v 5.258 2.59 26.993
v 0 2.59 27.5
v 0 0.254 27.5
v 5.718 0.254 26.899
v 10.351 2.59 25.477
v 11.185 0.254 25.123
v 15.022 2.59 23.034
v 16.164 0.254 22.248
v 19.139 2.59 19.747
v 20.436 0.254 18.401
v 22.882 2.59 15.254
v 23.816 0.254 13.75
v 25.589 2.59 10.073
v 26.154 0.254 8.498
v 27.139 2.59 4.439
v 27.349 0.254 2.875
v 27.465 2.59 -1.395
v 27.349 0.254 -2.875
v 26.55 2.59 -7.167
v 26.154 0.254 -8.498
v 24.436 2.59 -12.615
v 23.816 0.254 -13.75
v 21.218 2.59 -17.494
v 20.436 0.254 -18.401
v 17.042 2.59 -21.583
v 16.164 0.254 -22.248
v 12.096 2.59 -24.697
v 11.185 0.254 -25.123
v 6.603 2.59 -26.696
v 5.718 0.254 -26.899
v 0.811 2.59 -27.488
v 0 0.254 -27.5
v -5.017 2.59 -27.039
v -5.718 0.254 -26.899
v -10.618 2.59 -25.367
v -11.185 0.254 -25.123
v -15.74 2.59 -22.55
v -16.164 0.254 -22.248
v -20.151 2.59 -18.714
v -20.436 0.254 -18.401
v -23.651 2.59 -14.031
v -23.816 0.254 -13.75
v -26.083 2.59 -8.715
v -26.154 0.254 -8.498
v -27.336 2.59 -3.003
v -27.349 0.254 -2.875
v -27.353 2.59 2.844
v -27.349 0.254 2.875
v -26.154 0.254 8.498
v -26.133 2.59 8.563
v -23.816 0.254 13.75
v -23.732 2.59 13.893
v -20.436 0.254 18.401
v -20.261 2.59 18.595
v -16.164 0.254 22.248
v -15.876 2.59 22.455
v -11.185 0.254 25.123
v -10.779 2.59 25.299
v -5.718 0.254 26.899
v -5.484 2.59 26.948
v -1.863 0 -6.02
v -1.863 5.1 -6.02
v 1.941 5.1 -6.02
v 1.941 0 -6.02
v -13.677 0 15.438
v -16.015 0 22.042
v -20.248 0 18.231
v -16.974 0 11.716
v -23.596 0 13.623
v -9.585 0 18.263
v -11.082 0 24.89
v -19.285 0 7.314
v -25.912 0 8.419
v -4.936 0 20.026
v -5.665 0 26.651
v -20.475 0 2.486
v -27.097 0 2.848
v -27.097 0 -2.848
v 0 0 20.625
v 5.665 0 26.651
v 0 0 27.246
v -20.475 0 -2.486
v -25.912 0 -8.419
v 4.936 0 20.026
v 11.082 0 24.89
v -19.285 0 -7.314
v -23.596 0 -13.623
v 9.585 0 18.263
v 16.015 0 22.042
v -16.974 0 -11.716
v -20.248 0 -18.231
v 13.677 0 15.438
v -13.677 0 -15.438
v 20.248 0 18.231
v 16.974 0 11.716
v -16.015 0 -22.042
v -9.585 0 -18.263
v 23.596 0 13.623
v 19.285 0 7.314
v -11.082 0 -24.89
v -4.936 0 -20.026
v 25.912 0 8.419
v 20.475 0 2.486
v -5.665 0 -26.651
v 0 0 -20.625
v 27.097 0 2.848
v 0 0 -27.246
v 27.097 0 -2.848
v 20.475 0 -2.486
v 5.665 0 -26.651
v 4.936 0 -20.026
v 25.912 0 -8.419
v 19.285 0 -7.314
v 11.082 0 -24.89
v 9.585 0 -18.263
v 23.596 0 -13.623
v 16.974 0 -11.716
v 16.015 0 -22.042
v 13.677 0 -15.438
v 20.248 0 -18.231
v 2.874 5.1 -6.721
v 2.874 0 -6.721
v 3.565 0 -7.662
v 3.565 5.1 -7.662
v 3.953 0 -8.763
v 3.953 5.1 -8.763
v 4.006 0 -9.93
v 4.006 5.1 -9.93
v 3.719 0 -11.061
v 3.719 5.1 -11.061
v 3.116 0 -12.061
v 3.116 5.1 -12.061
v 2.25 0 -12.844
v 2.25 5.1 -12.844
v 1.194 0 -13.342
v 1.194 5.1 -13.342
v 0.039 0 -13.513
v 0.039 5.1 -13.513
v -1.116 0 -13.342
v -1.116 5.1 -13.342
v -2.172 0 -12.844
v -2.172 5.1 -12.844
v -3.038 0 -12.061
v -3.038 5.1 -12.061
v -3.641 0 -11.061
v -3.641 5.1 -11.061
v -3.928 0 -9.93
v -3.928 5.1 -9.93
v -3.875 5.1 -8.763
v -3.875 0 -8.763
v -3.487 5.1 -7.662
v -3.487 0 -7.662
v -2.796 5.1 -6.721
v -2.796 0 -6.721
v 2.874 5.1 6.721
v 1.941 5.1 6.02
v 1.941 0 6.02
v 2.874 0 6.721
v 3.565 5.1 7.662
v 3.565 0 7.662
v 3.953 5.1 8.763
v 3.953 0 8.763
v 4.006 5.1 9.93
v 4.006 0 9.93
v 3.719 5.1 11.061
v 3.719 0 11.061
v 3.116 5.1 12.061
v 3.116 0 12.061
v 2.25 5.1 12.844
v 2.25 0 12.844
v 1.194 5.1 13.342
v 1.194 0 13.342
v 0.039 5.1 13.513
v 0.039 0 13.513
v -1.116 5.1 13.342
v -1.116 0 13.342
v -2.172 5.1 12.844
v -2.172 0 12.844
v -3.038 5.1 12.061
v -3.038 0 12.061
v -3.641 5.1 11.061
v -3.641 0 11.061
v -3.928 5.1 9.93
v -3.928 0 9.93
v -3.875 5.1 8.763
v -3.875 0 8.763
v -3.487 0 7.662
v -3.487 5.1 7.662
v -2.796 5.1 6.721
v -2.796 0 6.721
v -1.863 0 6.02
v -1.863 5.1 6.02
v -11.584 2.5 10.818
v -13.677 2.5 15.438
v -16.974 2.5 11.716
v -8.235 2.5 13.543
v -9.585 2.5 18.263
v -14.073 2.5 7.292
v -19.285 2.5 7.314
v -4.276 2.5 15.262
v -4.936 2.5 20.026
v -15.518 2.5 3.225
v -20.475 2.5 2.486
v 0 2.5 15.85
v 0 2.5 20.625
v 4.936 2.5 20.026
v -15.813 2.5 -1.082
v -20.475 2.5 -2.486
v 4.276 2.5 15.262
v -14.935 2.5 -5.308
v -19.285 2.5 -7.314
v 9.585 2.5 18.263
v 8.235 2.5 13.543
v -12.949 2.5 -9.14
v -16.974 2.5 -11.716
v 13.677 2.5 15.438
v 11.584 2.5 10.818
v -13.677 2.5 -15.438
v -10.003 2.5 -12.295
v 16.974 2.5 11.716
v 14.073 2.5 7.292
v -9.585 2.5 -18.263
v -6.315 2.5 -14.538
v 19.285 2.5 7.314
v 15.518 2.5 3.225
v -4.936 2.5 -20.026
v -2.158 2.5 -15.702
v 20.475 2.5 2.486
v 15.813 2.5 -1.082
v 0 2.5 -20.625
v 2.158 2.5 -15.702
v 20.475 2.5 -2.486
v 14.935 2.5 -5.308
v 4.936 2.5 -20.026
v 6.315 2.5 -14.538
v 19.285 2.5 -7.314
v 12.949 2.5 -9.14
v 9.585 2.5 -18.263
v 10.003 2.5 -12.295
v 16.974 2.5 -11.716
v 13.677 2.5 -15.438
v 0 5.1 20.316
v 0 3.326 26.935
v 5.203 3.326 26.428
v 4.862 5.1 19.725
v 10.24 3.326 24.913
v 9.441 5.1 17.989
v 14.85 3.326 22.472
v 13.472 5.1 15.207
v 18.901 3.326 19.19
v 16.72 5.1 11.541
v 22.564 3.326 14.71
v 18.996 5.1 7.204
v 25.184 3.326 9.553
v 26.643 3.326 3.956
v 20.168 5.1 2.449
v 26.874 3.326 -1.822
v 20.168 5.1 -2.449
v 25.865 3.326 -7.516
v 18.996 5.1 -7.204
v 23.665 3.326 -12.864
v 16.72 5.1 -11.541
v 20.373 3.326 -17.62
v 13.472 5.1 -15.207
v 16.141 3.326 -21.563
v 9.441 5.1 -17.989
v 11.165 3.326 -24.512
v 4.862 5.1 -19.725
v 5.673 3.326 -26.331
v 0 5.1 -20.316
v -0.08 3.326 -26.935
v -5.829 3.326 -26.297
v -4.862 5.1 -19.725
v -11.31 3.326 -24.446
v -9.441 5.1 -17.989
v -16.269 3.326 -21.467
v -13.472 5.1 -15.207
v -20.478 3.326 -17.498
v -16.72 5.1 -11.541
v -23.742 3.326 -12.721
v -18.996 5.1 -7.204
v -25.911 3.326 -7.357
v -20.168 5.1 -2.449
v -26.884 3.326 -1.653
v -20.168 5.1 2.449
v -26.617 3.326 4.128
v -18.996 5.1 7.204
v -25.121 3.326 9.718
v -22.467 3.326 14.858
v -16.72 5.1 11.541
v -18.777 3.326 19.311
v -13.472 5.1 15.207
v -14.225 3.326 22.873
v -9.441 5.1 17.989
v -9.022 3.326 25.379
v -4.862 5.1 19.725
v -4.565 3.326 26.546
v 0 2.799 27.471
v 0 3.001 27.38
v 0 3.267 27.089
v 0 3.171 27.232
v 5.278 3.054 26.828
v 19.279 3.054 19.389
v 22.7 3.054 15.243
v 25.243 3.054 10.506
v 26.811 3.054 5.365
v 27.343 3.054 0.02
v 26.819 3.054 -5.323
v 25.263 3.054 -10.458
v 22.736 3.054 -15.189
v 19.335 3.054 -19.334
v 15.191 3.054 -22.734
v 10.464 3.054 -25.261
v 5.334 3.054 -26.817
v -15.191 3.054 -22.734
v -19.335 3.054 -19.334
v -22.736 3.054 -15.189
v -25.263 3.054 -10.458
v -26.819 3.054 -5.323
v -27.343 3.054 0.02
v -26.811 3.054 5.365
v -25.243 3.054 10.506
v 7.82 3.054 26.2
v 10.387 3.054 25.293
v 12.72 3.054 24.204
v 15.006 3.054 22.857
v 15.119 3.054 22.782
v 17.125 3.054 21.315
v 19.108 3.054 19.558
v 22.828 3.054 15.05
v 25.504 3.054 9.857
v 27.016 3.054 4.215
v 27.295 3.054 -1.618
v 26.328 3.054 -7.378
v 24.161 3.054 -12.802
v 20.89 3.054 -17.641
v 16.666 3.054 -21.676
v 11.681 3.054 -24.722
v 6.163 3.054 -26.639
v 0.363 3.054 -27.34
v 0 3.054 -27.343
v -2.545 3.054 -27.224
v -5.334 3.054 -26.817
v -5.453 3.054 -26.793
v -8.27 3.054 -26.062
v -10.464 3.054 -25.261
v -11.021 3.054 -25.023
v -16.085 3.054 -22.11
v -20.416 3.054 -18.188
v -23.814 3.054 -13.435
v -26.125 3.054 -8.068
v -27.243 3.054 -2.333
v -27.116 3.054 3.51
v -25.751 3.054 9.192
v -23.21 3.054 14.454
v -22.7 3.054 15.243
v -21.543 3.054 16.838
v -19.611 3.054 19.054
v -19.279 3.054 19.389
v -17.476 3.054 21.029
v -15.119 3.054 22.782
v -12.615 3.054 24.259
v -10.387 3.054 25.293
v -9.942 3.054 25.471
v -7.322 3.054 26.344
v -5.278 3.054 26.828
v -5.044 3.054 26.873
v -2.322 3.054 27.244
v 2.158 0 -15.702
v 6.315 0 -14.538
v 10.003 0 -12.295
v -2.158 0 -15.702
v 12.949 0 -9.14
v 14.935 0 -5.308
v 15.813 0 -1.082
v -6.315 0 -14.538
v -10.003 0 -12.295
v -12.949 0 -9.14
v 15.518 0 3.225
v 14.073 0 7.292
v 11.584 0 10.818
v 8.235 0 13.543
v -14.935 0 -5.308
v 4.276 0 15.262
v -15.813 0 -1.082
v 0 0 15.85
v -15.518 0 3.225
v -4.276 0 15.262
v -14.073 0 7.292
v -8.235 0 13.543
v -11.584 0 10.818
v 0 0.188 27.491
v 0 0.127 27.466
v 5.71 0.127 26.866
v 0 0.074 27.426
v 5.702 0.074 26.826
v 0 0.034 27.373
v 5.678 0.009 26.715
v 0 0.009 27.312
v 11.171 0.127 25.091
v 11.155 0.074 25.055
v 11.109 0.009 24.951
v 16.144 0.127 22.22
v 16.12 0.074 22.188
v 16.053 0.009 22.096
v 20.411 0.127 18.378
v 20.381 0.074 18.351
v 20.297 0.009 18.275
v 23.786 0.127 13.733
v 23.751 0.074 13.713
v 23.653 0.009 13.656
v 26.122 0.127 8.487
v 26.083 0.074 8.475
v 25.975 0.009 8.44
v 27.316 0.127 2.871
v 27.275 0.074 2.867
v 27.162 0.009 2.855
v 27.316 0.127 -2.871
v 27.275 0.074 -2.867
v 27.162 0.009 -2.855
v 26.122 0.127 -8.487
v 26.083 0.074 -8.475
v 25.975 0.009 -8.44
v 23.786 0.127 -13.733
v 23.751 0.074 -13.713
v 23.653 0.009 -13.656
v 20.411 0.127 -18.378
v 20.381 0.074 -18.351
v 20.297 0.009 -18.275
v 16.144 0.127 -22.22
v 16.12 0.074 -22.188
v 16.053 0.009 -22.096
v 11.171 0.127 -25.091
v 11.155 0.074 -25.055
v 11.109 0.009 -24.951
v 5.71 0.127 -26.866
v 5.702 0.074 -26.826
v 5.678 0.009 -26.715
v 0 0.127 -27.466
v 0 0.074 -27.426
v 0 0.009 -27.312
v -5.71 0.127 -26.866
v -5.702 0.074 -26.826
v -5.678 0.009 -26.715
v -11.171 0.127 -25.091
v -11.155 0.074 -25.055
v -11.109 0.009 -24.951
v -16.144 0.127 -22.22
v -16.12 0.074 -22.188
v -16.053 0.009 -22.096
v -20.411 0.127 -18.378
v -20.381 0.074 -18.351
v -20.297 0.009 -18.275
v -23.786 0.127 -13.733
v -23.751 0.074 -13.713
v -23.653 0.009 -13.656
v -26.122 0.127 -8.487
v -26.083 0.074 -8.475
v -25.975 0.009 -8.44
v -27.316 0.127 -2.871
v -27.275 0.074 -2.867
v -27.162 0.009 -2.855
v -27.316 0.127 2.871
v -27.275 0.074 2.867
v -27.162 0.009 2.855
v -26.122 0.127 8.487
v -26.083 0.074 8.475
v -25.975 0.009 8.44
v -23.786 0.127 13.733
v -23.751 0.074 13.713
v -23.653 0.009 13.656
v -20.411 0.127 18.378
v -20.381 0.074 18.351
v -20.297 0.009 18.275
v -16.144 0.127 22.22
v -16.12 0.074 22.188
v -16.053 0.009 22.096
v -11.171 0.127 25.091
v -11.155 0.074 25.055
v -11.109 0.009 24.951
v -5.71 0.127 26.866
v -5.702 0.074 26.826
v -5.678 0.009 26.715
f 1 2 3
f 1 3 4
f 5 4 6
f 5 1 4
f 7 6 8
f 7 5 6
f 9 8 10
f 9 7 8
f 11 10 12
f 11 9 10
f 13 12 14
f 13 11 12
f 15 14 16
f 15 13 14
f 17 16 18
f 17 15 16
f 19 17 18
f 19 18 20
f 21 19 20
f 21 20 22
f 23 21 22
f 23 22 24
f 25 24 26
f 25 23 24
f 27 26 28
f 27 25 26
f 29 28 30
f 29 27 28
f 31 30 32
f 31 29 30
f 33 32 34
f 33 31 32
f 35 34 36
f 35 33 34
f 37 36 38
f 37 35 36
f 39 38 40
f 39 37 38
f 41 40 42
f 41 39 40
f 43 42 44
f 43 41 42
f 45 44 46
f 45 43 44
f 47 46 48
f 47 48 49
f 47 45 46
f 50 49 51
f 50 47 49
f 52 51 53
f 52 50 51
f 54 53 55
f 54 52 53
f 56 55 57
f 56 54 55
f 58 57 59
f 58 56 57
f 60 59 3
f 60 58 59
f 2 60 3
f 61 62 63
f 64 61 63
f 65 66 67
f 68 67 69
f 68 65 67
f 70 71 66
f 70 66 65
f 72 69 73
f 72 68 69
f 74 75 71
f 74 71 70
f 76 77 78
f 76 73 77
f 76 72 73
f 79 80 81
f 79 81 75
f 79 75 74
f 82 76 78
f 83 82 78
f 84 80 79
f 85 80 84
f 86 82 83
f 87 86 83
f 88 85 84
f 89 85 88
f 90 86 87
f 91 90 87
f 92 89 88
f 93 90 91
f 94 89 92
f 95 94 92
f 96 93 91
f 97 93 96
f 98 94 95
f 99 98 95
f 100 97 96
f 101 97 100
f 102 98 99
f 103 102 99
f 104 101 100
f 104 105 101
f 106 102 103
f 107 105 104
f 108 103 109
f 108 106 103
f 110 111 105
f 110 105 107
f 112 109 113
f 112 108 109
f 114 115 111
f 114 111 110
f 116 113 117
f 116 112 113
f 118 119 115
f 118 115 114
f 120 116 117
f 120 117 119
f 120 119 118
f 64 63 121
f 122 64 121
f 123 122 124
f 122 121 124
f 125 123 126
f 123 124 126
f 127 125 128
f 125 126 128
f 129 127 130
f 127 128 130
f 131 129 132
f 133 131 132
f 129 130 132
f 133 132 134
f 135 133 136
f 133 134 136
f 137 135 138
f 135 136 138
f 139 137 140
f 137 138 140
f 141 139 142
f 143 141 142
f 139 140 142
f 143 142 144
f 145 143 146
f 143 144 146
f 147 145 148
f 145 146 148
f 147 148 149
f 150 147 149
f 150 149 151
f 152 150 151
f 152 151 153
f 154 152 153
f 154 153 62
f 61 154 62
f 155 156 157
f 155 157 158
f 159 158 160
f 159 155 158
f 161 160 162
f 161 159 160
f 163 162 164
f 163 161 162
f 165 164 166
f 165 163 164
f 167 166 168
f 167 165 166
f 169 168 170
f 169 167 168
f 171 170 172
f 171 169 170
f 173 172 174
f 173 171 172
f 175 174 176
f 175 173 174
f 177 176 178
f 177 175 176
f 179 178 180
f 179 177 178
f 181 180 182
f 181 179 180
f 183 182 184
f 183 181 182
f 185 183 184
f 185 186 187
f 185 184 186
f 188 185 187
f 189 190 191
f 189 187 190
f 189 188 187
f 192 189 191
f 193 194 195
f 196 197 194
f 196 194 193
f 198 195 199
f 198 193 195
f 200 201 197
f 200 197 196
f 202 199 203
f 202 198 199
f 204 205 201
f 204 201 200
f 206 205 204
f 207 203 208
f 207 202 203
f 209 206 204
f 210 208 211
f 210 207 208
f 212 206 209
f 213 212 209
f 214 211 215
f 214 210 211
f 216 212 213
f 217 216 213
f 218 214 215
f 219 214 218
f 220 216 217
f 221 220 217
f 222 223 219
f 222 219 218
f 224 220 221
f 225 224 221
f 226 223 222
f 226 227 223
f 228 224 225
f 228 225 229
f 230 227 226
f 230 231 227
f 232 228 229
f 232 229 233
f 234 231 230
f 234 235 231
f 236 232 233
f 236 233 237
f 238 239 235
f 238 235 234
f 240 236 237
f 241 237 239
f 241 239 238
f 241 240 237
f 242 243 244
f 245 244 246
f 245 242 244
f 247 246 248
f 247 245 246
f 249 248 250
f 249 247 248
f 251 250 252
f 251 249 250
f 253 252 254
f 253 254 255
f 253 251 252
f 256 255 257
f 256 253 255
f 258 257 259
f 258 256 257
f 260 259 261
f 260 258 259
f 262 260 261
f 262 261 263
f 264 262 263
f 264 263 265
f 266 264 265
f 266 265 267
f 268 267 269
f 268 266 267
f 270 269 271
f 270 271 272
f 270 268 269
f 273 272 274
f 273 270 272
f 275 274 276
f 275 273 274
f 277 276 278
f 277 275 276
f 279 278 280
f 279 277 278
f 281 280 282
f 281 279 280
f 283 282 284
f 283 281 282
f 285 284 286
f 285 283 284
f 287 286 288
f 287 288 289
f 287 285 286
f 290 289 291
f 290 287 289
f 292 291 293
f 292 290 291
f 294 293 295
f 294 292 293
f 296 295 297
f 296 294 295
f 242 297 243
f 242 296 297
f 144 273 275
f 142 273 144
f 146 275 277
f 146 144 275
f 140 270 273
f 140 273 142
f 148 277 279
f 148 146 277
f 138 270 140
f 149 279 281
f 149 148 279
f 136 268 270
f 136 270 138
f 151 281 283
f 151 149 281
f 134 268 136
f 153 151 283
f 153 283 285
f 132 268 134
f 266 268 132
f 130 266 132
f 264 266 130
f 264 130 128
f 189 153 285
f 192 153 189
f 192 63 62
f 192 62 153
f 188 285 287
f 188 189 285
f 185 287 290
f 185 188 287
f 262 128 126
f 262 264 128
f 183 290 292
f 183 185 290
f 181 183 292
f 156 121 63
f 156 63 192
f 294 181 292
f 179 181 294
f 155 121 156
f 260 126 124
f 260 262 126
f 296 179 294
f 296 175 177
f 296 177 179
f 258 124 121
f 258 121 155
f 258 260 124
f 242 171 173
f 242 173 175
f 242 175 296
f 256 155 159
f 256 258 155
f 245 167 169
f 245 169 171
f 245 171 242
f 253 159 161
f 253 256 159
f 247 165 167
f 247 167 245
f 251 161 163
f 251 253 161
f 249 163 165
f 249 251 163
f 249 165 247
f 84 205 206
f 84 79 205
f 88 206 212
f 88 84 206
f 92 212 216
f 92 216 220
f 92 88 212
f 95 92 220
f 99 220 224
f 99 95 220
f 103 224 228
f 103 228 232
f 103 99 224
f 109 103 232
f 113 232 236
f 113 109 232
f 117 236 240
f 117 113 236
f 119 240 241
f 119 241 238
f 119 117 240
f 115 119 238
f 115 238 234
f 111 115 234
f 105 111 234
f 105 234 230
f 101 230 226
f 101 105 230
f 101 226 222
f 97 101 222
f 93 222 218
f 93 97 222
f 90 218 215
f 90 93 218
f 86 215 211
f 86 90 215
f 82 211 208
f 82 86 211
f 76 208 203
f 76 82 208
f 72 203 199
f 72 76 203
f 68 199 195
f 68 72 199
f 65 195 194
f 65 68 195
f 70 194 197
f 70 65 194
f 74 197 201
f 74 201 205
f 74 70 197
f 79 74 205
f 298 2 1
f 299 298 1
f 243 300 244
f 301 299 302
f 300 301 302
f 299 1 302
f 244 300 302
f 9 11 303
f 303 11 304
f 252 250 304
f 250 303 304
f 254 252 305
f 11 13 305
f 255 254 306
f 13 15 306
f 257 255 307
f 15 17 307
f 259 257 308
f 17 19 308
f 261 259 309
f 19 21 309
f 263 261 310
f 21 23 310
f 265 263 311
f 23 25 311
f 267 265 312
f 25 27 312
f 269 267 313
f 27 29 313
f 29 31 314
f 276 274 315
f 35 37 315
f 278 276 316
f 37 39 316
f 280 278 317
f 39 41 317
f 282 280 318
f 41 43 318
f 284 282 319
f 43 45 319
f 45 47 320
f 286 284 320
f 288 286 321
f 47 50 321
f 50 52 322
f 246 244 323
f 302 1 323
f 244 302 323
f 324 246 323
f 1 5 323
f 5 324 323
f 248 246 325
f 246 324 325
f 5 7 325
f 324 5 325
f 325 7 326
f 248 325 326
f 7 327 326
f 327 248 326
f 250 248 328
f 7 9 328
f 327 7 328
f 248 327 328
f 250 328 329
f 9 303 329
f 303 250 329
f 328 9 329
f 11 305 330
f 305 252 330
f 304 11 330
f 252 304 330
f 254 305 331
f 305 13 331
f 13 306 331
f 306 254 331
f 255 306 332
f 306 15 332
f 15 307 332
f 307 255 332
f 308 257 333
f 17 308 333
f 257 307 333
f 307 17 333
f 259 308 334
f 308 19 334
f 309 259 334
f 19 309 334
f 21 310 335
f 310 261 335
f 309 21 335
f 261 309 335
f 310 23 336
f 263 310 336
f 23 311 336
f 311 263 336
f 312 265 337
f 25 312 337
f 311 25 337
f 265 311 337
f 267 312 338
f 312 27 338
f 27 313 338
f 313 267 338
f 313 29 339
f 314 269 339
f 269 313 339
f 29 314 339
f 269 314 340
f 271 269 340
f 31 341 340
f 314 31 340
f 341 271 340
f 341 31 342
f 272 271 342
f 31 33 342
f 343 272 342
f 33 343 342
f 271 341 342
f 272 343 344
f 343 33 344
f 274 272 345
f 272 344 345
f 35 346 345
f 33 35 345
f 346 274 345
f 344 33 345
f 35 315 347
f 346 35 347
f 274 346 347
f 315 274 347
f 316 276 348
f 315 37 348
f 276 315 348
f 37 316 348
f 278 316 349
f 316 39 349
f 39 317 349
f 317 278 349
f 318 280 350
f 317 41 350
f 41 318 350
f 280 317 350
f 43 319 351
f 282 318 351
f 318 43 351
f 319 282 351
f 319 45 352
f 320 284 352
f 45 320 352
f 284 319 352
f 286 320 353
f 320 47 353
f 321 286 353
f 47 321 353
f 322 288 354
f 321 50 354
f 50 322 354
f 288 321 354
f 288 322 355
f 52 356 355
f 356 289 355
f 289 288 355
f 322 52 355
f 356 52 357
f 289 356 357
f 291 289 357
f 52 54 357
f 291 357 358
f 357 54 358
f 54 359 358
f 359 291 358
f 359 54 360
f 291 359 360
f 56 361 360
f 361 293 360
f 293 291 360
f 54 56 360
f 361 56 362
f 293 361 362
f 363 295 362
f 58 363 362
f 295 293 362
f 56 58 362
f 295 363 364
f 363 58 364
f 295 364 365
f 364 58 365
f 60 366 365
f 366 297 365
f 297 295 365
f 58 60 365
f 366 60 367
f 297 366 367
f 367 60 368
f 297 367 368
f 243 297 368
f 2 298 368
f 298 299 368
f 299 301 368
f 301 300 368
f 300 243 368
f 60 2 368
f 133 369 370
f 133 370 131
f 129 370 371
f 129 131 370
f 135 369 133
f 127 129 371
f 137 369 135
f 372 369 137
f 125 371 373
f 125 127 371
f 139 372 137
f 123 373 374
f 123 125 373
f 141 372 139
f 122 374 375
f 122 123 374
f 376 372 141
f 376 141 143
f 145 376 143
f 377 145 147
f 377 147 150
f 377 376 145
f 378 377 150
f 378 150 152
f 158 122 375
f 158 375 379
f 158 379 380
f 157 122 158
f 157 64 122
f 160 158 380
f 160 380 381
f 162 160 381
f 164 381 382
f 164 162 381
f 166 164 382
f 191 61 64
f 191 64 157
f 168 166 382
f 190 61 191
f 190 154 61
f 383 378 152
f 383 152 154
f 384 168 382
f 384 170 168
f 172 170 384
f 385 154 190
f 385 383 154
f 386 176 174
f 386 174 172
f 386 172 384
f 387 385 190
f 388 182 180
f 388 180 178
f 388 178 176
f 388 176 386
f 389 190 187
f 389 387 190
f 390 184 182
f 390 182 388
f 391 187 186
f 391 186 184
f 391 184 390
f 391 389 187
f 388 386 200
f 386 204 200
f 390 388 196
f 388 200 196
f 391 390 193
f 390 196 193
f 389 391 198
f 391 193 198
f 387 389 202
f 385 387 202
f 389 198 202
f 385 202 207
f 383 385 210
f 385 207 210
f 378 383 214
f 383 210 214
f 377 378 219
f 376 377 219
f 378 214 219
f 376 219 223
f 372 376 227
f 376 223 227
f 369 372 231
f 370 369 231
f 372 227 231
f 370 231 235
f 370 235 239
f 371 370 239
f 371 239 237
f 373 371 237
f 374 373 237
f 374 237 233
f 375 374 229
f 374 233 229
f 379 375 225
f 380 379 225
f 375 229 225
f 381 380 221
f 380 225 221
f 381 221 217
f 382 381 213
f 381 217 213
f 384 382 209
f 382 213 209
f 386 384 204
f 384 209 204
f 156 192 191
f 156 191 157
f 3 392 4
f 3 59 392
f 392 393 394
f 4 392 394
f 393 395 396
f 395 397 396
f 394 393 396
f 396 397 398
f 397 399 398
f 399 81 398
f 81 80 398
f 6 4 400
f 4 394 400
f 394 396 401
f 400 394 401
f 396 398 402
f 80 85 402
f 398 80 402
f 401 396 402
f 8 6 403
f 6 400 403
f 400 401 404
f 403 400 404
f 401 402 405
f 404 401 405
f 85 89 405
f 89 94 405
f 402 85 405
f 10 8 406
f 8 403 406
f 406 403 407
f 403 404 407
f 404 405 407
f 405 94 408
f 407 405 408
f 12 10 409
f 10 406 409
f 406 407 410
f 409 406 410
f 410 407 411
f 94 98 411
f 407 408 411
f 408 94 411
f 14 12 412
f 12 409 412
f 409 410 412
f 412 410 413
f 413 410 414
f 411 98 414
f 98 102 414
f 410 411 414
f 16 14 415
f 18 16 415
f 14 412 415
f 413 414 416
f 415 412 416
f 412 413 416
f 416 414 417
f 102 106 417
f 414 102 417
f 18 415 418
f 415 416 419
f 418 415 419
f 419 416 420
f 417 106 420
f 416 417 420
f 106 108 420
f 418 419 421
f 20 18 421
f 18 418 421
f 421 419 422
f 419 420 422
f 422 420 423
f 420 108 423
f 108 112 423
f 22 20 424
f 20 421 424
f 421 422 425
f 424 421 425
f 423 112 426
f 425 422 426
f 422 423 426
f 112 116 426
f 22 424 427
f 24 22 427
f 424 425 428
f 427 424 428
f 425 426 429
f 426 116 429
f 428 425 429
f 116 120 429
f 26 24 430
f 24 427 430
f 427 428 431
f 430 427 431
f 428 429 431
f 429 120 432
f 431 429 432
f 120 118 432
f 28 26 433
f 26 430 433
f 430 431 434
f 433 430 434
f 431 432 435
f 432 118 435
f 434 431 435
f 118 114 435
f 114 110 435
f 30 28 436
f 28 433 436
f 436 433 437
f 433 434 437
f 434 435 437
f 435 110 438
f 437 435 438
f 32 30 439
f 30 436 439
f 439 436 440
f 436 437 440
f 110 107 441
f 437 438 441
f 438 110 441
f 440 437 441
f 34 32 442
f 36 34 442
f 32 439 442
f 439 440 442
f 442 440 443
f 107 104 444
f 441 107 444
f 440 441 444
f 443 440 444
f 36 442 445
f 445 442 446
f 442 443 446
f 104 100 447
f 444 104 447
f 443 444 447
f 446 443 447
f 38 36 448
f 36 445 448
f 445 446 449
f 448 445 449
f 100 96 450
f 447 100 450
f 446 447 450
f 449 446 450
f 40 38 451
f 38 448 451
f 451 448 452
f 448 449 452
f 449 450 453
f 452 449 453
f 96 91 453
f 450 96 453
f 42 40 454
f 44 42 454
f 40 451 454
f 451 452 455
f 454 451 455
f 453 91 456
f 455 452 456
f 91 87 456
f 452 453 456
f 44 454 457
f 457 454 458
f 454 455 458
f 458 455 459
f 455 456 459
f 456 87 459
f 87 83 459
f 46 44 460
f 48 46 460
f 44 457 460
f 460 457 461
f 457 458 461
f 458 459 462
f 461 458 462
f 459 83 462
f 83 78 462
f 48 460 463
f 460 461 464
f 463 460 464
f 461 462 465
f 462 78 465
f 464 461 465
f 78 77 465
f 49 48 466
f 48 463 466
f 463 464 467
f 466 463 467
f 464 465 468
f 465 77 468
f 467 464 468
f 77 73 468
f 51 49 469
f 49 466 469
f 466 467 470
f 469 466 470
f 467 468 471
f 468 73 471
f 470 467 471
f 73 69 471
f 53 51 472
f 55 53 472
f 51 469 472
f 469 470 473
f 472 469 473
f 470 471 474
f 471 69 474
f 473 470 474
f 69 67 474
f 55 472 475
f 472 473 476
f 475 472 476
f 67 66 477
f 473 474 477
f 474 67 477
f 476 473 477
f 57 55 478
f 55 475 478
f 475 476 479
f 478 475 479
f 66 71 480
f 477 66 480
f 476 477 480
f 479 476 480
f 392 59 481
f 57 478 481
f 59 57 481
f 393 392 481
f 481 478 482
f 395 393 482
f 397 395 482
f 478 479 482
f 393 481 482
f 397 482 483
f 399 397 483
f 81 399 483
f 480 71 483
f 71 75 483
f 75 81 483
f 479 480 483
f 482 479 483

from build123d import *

# Parameters (mm, degrees)
SKETCH2_W          = 15.85
SKETCH2_H          = 2.5
FILLET1_R          = 0.762
FILLET2_R          = 0.254
CUT_EXTRUDE1_DEPTH = 6.1


with BuildPart() as part:
    # Sketch1 → Flange (revolve)
    with BuildSketch(Plane(origin=(0, 0, 0), x_dir=(0, 0, -1), z_dir=(1, 0, 0))):
        Polygon((-27.5, 0), (-27.5, 3.175), (-20.315802195, 5.1), (0, 5.1), (0, 2.5), (-20.625, 2.5), (-20.625, 0), align=None)
    revolve(axis=Axis((0, 0, 0), (0, 1, 0)))

    # Sketch2 → Blank Insert (revolve)
    with BuildSketch(Plane(origin=(0, 0, 0), x_dir=(0, 0, -1), z_dir=(1, 0, 0))):
        with Locations((-7.925, 1.25)):
            Rectangle(SKETCH2_W, SKETCH2_H)
    revolve(axis=Axis((0, 0, 0), (0, -1, 0)))

    # Fillet1
    fillet1_edges = [part.edges().sort_by_distance(p)[0] for p in [
        (0, 3.175, -27.5),
    ]]
    fillet(fillet1_edges, radius=FILLET1_R)

    # Fillet2
    fillet2_edges = [part.edges().sort_by_distance(p)[0] for p in [
        (0, 0, -27.5),
    ]]
    fillet(fillet2_edges, radius=FILLET2_R)

    # Sketch3 → Cut-Extrude1 (cut, through all)
    with BuildSketch(Plane(origin=(0, 5.1, 0), x_dir=(1, 0, 0), z_dir=(0, 1, 0))):
        with BuildLine():
            Line((-1.862547623, 6.0198), (1.940673012, 6.0198))
            ThreePointArc((1.940673012, 6.0198), (0.039062695, 13.5128), (-1.862547623, 6.0198))
        make_face()
    cut_extrude1 = extrude(amount=-CUT_EXTRUDE1_DEPTH, mode=Mode.SUBTRACT)

    # Mirror1: Cut-Extrude1 across plane
    add(cut_extrude1.mirror(Plane.XY), mode=Mode.SUBTRACT)


solid = part.part
